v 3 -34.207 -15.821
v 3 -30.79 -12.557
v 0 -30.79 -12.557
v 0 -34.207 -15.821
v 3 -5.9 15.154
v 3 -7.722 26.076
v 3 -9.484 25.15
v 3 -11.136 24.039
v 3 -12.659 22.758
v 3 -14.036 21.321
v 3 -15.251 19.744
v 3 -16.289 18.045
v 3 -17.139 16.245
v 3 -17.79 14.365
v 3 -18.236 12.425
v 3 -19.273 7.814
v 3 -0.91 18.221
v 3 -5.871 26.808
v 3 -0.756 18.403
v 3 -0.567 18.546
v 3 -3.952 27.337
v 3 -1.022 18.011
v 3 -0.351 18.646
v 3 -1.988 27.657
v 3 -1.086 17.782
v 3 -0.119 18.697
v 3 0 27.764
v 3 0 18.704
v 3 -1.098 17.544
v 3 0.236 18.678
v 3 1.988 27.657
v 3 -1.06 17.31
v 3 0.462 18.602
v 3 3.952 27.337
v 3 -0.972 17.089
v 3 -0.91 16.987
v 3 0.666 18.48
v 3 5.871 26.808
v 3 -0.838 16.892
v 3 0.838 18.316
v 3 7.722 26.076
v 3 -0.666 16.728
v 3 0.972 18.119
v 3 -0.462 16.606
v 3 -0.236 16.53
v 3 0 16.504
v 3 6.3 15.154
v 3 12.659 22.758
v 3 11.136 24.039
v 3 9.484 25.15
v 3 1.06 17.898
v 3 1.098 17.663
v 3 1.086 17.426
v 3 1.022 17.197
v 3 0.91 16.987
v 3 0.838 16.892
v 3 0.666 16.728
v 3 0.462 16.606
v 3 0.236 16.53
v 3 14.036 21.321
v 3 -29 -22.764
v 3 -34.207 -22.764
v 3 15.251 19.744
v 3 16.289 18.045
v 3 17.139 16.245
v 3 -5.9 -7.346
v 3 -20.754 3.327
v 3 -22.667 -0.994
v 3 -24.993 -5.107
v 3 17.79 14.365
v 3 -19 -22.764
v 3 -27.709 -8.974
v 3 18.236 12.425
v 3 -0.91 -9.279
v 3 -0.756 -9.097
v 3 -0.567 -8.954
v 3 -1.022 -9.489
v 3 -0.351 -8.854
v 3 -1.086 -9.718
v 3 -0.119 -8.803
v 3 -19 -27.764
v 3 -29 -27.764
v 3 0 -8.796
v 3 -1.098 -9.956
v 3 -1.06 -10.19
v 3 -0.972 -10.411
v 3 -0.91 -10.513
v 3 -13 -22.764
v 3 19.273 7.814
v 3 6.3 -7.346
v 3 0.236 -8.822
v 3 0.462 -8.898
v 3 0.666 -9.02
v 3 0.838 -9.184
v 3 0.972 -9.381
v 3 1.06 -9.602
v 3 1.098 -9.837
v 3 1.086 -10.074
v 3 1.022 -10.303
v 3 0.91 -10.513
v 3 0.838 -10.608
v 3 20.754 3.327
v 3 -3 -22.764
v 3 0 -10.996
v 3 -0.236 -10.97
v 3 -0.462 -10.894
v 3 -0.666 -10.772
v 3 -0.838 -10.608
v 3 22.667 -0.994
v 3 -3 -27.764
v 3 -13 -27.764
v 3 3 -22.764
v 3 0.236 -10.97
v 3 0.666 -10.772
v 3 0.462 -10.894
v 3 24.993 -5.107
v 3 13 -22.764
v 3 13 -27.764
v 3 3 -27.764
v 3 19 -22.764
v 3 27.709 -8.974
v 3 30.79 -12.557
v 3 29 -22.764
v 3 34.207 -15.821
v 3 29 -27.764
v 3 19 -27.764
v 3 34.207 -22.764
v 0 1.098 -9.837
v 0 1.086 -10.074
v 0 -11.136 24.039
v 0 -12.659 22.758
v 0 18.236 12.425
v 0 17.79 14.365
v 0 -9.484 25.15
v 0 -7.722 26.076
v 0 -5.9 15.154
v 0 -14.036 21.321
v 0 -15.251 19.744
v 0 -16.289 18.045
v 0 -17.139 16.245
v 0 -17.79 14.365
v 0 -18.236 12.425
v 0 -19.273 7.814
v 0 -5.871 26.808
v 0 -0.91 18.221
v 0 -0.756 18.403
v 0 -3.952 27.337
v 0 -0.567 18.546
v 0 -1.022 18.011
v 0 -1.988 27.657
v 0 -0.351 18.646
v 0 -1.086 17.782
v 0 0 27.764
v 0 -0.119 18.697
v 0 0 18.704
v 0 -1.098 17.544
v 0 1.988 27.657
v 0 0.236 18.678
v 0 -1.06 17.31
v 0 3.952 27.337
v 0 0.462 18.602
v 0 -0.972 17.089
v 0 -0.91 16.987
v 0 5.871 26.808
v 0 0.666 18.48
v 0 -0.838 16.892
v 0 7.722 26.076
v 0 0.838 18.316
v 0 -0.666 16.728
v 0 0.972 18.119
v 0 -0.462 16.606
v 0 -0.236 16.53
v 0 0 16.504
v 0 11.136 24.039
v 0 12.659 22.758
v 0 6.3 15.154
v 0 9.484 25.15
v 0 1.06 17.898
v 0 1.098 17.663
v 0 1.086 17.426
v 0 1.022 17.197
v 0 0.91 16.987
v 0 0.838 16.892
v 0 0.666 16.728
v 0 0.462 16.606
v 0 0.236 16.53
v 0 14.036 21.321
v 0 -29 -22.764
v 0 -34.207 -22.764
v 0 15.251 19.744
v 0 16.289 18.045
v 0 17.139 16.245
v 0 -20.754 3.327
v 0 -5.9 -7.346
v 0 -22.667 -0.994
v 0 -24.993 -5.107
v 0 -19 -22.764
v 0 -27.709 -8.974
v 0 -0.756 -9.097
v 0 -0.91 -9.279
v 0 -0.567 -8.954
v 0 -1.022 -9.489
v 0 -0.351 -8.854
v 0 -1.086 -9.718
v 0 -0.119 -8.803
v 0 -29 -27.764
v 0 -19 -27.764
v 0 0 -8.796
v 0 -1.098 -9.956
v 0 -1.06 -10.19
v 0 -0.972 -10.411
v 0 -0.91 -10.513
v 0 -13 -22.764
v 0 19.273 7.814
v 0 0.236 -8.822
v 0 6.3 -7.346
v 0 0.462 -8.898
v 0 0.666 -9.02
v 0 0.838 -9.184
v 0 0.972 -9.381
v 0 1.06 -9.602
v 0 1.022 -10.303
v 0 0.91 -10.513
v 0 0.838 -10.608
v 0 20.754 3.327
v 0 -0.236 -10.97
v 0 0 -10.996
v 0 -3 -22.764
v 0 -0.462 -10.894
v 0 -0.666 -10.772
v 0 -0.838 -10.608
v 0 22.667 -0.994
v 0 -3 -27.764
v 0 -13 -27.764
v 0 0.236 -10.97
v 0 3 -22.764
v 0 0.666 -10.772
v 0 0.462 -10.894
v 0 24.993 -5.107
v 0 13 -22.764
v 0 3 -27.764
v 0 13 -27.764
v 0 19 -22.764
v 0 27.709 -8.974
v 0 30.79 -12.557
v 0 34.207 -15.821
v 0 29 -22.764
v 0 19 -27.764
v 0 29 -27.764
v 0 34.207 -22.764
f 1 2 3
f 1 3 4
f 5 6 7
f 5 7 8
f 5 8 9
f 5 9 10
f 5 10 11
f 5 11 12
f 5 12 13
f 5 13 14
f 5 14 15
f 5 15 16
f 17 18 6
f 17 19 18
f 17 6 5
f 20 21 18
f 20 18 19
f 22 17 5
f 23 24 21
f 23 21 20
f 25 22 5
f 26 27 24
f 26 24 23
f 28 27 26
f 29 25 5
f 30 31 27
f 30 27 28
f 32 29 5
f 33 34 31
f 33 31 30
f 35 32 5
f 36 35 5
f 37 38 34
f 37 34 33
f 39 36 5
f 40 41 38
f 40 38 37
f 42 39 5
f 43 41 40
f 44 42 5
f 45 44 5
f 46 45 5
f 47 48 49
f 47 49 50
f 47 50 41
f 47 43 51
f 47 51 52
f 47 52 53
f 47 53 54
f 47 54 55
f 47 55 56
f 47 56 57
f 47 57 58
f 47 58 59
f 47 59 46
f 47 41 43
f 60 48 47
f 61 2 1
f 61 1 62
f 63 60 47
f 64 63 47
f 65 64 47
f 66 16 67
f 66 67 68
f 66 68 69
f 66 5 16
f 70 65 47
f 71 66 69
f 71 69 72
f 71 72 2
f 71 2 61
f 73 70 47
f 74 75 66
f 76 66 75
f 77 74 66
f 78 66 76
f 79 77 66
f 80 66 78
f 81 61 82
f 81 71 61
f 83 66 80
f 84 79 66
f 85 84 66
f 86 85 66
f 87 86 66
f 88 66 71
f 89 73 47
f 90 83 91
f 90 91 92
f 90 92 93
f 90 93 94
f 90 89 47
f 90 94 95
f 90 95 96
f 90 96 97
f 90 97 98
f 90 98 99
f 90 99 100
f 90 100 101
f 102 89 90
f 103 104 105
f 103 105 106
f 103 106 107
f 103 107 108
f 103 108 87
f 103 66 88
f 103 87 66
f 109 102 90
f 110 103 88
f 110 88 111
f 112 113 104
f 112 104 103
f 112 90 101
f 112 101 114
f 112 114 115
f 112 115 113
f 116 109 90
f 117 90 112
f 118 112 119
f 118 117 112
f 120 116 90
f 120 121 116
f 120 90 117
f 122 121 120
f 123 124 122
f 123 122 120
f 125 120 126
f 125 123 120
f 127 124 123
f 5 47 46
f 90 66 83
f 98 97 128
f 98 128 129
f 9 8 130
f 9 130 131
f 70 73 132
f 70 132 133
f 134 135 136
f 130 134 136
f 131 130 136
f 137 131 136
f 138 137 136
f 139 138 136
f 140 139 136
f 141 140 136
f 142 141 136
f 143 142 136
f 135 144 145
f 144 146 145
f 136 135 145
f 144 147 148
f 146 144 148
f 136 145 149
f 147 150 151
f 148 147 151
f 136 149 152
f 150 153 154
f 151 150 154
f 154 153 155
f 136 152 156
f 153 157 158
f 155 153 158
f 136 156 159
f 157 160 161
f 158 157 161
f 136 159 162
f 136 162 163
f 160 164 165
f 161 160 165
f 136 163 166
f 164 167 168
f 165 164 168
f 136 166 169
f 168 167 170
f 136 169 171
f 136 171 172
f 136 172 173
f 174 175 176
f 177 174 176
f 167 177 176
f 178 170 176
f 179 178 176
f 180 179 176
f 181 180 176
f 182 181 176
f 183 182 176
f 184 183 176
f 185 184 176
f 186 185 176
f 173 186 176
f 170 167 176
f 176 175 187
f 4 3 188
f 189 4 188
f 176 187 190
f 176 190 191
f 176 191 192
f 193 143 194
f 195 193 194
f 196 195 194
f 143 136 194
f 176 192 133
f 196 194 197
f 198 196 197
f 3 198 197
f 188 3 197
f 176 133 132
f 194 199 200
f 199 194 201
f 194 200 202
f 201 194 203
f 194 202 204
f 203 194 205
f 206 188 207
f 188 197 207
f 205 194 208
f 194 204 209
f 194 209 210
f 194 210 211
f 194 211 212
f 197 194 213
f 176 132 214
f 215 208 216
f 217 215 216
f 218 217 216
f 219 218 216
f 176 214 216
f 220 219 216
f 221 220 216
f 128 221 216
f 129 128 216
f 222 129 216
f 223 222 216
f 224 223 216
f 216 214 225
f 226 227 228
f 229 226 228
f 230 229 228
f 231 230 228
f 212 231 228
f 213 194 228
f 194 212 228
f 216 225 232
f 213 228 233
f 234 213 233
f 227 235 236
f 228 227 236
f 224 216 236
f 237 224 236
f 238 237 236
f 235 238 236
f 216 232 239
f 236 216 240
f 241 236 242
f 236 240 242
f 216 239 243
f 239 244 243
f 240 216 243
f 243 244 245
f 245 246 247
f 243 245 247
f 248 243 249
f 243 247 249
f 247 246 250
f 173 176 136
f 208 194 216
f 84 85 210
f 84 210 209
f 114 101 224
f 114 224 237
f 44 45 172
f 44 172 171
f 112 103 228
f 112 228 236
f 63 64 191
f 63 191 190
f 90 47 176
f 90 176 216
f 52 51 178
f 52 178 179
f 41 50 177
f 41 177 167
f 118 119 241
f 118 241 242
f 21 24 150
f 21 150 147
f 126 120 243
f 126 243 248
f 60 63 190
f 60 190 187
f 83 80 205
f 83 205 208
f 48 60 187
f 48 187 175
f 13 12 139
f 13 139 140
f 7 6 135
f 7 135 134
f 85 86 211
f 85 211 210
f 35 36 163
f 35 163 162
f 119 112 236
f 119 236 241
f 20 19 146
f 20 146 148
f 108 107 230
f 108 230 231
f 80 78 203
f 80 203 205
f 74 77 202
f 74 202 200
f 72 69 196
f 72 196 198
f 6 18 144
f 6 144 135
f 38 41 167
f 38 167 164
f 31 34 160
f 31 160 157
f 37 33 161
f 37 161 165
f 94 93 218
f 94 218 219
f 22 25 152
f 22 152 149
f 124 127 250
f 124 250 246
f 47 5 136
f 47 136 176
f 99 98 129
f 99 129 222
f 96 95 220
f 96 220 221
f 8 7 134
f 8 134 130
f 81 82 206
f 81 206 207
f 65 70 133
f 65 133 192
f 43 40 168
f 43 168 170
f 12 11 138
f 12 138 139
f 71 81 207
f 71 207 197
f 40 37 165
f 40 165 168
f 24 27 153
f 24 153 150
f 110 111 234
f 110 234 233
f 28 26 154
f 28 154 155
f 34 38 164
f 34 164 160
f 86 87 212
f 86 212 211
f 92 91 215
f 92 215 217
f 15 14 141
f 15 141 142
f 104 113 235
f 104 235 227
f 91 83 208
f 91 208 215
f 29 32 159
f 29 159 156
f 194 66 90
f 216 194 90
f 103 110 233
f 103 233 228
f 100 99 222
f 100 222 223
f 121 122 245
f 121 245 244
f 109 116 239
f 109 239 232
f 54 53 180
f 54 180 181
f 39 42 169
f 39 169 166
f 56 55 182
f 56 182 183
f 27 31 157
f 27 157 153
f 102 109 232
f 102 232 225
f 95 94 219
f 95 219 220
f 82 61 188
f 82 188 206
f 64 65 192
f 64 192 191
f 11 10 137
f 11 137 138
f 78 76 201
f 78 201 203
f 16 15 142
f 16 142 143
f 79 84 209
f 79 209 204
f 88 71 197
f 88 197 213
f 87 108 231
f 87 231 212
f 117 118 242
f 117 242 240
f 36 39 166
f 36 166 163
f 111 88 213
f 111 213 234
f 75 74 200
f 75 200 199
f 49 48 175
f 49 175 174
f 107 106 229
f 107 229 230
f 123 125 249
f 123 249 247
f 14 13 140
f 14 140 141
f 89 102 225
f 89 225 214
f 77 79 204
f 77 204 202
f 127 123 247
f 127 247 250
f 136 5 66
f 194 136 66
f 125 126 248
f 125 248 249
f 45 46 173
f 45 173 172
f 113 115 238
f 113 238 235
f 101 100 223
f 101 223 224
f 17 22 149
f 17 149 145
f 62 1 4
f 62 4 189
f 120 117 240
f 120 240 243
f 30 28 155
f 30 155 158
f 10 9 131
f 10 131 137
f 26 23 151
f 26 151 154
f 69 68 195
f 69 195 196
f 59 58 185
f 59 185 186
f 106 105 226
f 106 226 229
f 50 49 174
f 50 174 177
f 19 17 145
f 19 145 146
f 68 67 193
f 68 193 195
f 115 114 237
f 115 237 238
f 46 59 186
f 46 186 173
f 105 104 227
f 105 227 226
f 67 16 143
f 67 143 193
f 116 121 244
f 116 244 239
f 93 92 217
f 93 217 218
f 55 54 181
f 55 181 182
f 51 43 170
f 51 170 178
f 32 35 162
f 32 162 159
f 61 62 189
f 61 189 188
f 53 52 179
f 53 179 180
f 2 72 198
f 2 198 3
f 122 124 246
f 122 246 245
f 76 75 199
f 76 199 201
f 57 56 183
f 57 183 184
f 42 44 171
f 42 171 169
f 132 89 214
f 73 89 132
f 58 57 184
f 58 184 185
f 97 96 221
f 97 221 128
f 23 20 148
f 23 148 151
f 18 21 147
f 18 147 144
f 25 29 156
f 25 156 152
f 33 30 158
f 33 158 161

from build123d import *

# Parameters (mm, degrees)
SKETCH1_W           = 22.5
SKETCH1_H           = 12.2
BOSS_EXTRUDE1_DEPTH = 3.000000026


with BuildPart() as part:
    # Sketch1 → Boss-Extrude1 (new body)
    with BuildSketch(Plane(origin=(3.000000026, 0, 0), x_dir=(0, 0, -1), z_dir=(1, 0, 0))):
        Polygon((-21.320657805, 14.036174864), (-22.758102044, 12.659284286), (-24.039382115, 11.136000976), (-25.149684399, 9.483940899), (-26.076165959, 7.722207811), (-26.808116585, 5.871174857), (-27.337068692, 3.952247556), (-27.656905353, 1.987616299), (-27.763931081, 0), (-27.656905353, -1.987616299), (-27.337068692, -3.952247556), (-26.808116585, -5.871174857), (-26.076165959, -7.722207811), (-25.149684399, -9.483940899), (-24.039382115, -11.136000976), (-22.758102044, -12.659284286), (-21.320657805, -14.036174864), (-19.743673503, -15.250750817), (-18.045384437, -16.28896594), (-16.245434061, -17.138814554), (-14.364630915, -17.790470272), (-12.424727902, -18.236396834), (-7.814312354, -19.272558391), (-3.327161307, -20.754124969), (0.993806054, -22.666925564), (5.107260309, -24.992663413), (8.973857388, -27.709092945), (12.55661156, -30.790233985), (15.821257606, -34.206613898), (22.763932127, -34.206613898), (22.763932127, -28.999887407), (27.763931084, -28.999887407), (27.763931084, -18.99988763), (22.763932127, -18.99988763), (22.763932127, -12.999887578), (27.763931084, -12.999887578), (27.763931084, -2.999887569), (22.763932127, -2.999887569), (22.763932127, 3.000112483), (27.763931084, 3.000112483), (27.763931084, 13.000112027), (22.763932127, 13.000112027), (22.763932127, 19.00011301), (27.763931084, 19.00011301), (27.763931084, 29.000112787), (22.763932127, 29.000112787), (22.763932127, 34.206613898), (15.821257606, 34.206613898), (12.55661156, 30.790233985), (8.973857388, 27.709092945), (5.107260309, 24.992661551), (0.993806054, 22.666923702), (-3.327161307, 20.754123107), (-7.814312354, 19.272556528), (-12.424727902, 18.236394972), (-14.364630915, 17.790470272), (-16.245434061, 17.138814554), (-18.045384437, 16.28896594), (-19.743673503, 15.250750817), align=None)
        with Locations((-3.903931454, 0.199999778)):
            Rectangle(SKETCH1_W, SKETCH1_H, mode=Mode.SUBTRACT)
        Polygon((-18.119180575, 0.971863221), (-17.898211256, 1.059905044), (-17.663484439, 1.098386711), (-17.425971106, 1.085509197), (-17.196778208, 1.02187437), (-16.986625269, 0.910457922), (-16.891805455, 0.83837827), (-16.728227958, 0.665691623), (-16.605598852, 0.461878022), (-16.529647633, 0.236467487), (-16.503928229, 0), (-16.529647633, -0.236467487), (-16.605598852, -0.461878022), (-16.728227958, -0.665691623), (-16.891805455, -0.83837827), (-16.986625269, -0.910457922), (-17.088681459, -0.971863221), (-17.309648916, -1.059905044), (-17.544377595, -1.098386711), (-17.781890929, -1.085509197), (-18.011083826, -1.02187437), (-18.221236765, -0.910457922), (-18.402526155, -0.756469381), (-18.546473235, -0.567109266), (-18.64635013, -0.351231691), (-18.697483465, -0.118930919), (-18.70393008, 0), (-18.678214401, 0.236467487), (-18.602263182, 0.461878022), (-18.479634076, 0.665691623), (-18.316056579, 0.83837827), align=None, mode=Mode.SUBTRACT)
        Polygon((9.380819276, 0.971863221), (9.601787664, 1.059905044), (9.836516343, 1.098386711), (10.074028745, 1.085509197), (10.303220712, 1.02187437), (10.513374582, 0.910457922), (10.608193465, 0.83837827), (10.771771893, 0.665691623), (10.89440193, 0.461878022), (10.970351286, 0.236467487), (10.996068828, 0), (10.970351286, -0.236467487), (10.89440193, -0.461878022), (10.771771893, -0.665691623), (10.608193465, -0.83837827), (10.513374582, -0.910457922), (10.411318392, -0.971863221), (10.190350004, -1.059905044), (9.955622256, -1.098386711), (9.718108922, -1.085509197), (9.488916956, -1.02187437), (9.278763086, -0.910457922), (9.097473696, -0.756469381), (8.953525685, -0.567109266), (8.853650652, -0.351231691), (8.802517317, -0.118930919), (8.79606884, 0), (8.821786381, 0.236467487), (8.897735737, 0.461878022), (9.020366706, 0.665691623), (9.183944203, 0.83837827), align=None, mode=Mode.SUBTRACT)
    extrude(amount=-BOSS_EXTRUDE1_DEPTH)


solid = part.part
